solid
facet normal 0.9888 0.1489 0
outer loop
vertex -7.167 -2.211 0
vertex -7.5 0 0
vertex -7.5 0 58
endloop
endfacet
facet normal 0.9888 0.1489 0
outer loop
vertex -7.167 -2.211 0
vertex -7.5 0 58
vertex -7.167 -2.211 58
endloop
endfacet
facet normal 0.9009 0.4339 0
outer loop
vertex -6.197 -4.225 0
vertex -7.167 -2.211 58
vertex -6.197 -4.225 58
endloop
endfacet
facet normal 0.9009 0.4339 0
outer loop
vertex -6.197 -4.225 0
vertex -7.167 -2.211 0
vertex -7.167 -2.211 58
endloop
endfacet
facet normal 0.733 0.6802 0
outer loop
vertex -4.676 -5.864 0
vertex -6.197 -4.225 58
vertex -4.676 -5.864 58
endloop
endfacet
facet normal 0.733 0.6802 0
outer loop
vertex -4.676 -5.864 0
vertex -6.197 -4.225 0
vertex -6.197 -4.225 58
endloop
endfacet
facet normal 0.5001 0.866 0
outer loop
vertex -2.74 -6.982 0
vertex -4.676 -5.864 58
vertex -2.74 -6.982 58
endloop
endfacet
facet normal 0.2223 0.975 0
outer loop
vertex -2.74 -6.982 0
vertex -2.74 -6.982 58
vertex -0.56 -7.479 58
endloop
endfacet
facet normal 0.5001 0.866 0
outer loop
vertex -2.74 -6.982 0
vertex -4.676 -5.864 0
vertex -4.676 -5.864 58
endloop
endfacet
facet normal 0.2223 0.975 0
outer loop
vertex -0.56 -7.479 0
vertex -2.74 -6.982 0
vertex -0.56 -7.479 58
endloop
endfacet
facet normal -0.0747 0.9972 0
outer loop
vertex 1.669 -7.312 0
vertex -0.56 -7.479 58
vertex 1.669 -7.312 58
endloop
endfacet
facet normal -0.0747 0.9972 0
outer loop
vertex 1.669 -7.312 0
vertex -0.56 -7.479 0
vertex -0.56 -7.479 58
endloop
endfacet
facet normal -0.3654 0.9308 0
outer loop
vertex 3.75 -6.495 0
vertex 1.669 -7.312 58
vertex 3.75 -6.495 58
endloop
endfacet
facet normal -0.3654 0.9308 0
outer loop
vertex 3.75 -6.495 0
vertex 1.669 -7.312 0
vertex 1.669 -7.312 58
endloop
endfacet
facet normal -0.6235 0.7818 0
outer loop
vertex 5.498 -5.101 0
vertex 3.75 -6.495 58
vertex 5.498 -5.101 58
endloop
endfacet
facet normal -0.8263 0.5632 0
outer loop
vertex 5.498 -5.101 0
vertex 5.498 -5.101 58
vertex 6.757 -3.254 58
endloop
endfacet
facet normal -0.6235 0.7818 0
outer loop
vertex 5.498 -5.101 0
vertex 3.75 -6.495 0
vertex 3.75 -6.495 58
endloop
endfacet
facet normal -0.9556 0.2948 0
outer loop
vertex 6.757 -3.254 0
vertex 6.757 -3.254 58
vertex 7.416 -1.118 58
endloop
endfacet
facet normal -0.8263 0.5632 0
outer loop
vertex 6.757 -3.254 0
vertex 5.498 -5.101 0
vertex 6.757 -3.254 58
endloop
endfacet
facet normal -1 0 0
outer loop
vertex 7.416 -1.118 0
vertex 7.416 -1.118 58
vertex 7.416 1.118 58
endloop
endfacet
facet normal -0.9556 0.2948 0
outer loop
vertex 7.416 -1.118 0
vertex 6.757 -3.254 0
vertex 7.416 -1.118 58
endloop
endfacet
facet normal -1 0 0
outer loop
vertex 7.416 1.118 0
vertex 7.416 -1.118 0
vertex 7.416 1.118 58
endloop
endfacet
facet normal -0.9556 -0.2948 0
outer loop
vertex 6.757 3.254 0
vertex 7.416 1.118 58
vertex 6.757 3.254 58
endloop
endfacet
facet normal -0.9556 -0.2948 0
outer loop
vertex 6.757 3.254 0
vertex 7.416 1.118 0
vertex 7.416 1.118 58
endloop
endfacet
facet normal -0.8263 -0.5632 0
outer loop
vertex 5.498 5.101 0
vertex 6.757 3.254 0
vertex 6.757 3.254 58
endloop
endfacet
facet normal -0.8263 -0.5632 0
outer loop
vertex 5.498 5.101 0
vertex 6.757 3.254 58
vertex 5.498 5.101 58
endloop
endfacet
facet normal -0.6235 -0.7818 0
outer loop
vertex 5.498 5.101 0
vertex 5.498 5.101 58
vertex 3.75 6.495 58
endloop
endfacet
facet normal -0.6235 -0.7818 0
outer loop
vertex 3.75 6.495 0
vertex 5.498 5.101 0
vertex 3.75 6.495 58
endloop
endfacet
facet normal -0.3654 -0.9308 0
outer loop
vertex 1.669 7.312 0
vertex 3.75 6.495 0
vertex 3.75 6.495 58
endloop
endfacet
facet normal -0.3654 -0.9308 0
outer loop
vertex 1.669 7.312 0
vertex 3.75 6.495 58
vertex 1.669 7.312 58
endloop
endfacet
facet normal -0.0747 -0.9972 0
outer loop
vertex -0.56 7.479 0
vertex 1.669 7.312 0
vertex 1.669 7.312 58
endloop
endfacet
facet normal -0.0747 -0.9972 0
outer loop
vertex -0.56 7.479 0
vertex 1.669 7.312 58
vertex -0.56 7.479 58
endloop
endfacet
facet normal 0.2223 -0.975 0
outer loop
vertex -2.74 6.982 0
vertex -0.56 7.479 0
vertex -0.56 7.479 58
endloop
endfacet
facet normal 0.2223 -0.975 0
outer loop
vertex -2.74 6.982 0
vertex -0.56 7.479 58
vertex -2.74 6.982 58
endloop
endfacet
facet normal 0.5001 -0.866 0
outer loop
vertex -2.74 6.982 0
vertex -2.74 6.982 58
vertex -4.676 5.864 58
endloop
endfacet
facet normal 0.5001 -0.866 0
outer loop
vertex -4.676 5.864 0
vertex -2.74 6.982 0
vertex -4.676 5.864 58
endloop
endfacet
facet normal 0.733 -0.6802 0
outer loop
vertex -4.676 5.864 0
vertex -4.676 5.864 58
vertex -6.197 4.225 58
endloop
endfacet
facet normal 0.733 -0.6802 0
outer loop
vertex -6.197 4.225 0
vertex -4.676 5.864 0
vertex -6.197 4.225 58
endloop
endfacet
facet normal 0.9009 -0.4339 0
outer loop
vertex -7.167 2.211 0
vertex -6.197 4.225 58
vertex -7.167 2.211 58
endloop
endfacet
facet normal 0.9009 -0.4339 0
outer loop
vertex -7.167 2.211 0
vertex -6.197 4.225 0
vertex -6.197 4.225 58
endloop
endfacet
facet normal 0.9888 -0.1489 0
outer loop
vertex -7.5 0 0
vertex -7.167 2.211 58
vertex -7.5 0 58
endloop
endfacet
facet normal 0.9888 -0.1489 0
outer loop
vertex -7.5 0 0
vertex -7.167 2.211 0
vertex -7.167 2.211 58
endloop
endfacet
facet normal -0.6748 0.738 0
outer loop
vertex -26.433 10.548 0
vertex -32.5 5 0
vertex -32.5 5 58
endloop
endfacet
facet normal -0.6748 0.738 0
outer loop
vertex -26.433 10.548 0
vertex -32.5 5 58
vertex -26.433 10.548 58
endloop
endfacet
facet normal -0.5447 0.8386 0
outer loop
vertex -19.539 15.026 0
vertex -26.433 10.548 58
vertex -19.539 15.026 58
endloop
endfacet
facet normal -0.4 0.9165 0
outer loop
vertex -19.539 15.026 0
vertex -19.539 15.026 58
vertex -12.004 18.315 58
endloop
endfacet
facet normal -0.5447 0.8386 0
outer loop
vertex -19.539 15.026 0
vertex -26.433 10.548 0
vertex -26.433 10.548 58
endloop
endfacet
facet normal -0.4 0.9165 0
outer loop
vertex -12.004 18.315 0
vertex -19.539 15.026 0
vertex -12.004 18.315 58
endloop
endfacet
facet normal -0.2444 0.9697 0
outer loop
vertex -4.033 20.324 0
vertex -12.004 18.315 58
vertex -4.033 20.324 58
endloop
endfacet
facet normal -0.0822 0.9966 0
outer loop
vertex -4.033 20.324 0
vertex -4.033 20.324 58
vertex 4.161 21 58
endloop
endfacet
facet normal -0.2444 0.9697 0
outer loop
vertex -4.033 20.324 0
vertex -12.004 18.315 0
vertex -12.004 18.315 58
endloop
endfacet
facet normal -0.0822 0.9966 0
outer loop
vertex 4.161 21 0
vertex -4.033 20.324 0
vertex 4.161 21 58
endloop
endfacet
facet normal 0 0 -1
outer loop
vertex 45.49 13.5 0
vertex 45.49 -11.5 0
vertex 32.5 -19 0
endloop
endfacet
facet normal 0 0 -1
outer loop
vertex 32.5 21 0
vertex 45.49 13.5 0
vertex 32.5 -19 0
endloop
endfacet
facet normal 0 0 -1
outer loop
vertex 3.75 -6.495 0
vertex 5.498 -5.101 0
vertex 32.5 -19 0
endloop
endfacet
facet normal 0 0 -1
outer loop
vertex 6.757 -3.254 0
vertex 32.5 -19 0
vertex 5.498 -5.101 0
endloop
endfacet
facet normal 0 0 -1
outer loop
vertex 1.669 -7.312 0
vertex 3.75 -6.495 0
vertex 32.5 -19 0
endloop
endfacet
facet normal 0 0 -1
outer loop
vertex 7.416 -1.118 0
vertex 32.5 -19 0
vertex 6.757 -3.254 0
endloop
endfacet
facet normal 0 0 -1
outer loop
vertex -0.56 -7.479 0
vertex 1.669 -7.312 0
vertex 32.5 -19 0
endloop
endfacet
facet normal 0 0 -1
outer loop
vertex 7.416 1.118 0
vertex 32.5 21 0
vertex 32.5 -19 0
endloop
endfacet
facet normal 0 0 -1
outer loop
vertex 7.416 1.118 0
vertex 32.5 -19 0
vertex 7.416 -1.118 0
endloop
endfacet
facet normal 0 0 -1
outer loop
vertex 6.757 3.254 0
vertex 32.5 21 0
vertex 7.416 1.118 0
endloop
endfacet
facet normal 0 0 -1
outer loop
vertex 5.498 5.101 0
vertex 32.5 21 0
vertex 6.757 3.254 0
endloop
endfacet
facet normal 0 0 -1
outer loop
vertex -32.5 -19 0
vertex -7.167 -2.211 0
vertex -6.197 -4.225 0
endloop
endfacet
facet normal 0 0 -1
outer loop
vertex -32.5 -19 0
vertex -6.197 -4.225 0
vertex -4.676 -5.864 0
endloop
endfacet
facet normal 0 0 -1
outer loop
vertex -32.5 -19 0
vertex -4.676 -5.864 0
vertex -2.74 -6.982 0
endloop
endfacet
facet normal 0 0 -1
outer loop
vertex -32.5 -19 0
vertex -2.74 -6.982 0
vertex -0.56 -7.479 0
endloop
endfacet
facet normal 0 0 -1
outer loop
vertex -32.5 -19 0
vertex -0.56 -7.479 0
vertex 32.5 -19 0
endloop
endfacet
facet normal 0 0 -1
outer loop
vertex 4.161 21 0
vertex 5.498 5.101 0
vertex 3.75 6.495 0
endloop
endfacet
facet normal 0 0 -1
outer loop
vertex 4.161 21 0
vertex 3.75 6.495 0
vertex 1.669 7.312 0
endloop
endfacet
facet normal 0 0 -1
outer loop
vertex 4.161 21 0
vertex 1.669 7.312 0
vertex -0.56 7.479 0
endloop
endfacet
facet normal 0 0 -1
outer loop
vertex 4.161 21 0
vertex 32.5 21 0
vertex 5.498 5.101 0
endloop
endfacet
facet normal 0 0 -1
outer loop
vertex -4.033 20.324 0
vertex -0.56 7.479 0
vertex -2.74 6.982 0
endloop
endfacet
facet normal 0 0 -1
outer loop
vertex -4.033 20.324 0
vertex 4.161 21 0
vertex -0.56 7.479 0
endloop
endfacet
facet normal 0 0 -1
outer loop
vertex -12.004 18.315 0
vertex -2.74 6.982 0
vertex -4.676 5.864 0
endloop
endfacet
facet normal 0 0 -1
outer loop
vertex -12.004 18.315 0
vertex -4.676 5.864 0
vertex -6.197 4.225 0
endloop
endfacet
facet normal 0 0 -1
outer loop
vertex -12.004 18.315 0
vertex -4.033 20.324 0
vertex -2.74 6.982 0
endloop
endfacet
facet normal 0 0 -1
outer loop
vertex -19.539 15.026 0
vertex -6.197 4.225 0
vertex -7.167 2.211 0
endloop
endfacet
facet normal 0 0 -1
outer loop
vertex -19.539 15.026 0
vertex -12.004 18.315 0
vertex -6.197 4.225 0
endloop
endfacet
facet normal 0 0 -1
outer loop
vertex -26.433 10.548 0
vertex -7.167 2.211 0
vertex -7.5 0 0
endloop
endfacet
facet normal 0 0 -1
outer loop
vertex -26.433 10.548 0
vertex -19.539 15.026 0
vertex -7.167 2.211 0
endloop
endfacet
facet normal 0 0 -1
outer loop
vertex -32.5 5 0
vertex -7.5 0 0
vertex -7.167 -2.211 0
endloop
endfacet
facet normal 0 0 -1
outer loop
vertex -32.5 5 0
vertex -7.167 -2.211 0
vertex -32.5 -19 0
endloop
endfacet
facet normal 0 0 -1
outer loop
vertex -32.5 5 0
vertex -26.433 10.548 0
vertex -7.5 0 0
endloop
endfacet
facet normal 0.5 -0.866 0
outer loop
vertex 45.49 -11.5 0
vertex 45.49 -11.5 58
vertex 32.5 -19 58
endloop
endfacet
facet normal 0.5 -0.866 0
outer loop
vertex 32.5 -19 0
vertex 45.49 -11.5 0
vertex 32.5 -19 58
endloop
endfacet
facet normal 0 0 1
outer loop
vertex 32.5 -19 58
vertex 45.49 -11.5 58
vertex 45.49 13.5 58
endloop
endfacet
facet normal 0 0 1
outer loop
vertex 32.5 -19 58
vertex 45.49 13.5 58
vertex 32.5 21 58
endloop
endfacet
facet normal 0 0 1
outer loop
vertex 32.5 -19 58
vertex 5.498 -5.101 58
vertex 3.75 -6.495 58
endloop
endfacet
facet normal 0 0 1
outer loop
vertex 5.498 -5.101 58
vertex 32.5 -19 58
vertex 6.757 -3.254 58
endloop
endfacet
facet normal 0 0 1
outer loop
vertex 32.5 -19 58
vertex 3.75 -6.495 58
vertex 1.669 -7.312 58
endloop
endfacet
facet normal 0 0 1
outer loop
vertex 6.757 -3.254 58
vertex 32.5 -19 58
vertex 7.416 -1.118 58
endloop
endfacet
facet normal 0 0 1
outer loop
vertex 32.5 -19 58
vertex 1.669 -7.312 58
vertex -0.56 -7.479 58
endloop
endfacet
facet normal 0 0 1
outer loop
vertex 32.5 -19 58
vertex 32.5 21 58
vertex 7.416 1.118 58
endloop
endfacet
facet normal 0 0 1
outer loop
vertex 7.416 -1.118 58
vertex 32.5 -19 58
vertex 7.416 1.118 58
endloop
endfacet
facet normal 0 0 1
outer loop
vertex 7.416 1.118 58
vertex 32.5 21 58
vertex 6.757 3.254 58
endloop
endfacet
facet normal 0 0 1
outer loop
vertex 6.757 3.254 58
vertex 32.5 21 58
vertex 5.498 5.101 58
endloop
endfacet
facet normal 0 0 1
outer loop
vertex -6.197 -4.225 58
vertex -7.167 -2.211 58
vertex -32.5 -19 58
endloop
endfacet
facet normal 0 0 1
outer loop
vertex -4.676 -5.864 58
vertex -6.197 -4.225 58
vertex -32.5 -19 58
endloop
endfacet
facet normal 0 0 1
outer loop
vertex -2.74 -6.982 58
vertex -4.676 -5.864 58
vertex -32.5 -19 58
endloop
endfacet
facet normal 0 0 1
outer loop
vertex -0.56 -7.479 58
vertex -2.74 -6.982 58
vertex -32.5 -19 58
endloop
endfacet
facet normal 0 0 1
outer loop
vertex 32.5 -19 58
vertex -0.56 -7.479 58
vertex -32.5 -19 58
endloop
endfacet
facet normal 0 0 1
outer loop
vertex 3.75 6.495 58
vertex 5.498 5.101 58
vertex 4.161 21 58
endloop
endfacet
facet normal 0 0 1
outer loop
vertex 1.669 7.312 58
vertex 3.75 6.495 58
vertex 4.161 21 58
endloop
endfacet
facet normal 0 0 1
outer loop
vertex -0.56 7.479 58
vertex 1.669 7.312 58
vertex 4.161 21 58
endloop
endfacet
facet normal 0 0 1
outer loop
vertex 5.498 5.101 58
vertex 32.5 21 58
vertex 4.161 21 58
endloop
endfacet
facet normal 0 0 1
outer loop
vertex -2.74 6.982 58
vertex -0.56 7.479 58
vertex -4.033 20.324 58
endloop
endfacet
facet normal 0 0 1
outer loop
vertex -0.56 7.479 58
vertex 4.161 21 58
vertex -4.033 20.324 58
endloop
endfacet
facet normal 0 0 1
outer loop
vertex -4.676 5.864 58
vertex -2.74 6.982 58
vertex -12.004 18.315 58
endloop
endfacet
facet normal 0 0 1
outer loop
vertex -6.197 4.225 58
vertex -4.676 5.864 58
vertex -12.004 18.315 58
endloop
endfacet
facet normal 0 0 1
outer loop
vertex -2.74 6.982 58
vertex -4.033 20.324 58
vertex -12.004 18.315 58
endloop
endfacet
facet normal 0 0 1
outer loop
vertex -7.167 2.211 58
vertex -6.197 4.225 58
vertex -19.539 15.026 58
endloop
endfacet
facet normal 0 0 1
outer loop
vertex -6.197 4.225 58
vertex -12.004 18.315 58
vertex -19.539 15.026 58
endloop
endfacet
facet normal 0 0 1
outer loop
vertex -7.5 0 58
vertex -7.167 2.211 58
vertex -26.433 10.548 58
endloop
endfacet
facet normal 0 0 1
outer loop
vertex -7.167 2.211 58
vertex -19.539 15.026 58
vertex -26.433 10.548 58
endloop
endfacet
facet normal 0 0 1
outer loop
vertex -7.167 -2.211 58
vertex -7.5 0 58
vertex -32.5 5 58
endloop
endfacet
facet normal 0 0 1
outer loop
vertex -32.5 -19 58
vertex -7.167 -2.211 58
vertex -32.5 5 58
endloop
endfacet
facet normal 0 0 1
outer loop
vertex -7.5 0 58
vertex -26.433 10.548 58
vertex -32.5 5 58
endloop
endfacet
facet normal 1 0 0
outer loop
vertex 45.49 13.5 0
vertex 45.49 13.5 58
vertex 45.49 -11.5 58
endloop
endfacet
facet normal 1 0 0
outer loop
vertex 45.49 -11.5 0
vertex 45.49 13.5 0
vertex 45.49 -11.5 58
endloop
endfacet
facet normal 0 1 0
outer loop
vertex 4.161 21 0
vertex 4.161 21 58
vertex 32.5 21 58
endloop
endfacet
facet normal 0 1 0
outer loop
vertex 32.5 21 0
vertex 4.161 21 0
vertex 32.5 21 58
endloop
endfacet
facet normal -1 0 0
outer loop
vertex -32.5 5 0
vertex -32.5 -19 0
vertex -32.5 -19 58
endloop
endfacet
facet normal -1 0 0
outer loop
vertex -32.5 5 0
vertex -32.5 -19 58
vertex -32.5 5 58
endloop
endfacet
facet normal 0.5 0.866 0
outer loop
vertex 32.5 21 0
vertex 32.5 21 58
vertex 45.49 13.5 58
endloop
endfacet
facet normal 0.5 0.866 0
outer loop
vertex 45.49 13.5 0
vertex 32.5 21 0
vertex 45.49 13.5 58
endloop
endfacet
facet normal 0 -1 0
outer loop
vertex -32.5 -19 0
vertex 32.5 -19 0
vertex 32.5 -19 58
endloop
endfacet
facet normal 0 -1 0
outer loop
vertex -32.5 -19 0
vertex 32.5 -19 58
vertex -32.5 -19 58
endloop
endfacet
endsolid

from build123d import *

# Parameters (mm, degrees)
SKETCH1_R           = 7.5
BOSS_EXTRUDE1_DEPTH = 58


with BuildPart() as part:
    # Sketch1 → Boss-Extrude1 (new body)
    with BuildSketch(Plane.XY):
        with BuildLine():
            Line((32.5, -19), (-32.5, -19))
            Line((-32.5, -19), (-32.5, 5))
            ThreePointArc((-32.5, 5), (-15.83939444, 16.82575695), (4.16060556, 21))
            Line((4.16060556, 21), (32.5, 21))
            Line((32.5, 21), (45.490381057, 13.5))
            Line((45.490381057, 13.5), (45.490381057, -11.5))
            Line((45.490381057, -11.5), (32.5, -19))
        make_face()
        with Locations(Location((0, 0, 0), (0, 0, 180))):
            Circle(SKETCH1_R, mode=Mode.SUBTRACT)
    extrude(amount=BOSS_EXTRUDE1_DEPTH)


solid = part.part
